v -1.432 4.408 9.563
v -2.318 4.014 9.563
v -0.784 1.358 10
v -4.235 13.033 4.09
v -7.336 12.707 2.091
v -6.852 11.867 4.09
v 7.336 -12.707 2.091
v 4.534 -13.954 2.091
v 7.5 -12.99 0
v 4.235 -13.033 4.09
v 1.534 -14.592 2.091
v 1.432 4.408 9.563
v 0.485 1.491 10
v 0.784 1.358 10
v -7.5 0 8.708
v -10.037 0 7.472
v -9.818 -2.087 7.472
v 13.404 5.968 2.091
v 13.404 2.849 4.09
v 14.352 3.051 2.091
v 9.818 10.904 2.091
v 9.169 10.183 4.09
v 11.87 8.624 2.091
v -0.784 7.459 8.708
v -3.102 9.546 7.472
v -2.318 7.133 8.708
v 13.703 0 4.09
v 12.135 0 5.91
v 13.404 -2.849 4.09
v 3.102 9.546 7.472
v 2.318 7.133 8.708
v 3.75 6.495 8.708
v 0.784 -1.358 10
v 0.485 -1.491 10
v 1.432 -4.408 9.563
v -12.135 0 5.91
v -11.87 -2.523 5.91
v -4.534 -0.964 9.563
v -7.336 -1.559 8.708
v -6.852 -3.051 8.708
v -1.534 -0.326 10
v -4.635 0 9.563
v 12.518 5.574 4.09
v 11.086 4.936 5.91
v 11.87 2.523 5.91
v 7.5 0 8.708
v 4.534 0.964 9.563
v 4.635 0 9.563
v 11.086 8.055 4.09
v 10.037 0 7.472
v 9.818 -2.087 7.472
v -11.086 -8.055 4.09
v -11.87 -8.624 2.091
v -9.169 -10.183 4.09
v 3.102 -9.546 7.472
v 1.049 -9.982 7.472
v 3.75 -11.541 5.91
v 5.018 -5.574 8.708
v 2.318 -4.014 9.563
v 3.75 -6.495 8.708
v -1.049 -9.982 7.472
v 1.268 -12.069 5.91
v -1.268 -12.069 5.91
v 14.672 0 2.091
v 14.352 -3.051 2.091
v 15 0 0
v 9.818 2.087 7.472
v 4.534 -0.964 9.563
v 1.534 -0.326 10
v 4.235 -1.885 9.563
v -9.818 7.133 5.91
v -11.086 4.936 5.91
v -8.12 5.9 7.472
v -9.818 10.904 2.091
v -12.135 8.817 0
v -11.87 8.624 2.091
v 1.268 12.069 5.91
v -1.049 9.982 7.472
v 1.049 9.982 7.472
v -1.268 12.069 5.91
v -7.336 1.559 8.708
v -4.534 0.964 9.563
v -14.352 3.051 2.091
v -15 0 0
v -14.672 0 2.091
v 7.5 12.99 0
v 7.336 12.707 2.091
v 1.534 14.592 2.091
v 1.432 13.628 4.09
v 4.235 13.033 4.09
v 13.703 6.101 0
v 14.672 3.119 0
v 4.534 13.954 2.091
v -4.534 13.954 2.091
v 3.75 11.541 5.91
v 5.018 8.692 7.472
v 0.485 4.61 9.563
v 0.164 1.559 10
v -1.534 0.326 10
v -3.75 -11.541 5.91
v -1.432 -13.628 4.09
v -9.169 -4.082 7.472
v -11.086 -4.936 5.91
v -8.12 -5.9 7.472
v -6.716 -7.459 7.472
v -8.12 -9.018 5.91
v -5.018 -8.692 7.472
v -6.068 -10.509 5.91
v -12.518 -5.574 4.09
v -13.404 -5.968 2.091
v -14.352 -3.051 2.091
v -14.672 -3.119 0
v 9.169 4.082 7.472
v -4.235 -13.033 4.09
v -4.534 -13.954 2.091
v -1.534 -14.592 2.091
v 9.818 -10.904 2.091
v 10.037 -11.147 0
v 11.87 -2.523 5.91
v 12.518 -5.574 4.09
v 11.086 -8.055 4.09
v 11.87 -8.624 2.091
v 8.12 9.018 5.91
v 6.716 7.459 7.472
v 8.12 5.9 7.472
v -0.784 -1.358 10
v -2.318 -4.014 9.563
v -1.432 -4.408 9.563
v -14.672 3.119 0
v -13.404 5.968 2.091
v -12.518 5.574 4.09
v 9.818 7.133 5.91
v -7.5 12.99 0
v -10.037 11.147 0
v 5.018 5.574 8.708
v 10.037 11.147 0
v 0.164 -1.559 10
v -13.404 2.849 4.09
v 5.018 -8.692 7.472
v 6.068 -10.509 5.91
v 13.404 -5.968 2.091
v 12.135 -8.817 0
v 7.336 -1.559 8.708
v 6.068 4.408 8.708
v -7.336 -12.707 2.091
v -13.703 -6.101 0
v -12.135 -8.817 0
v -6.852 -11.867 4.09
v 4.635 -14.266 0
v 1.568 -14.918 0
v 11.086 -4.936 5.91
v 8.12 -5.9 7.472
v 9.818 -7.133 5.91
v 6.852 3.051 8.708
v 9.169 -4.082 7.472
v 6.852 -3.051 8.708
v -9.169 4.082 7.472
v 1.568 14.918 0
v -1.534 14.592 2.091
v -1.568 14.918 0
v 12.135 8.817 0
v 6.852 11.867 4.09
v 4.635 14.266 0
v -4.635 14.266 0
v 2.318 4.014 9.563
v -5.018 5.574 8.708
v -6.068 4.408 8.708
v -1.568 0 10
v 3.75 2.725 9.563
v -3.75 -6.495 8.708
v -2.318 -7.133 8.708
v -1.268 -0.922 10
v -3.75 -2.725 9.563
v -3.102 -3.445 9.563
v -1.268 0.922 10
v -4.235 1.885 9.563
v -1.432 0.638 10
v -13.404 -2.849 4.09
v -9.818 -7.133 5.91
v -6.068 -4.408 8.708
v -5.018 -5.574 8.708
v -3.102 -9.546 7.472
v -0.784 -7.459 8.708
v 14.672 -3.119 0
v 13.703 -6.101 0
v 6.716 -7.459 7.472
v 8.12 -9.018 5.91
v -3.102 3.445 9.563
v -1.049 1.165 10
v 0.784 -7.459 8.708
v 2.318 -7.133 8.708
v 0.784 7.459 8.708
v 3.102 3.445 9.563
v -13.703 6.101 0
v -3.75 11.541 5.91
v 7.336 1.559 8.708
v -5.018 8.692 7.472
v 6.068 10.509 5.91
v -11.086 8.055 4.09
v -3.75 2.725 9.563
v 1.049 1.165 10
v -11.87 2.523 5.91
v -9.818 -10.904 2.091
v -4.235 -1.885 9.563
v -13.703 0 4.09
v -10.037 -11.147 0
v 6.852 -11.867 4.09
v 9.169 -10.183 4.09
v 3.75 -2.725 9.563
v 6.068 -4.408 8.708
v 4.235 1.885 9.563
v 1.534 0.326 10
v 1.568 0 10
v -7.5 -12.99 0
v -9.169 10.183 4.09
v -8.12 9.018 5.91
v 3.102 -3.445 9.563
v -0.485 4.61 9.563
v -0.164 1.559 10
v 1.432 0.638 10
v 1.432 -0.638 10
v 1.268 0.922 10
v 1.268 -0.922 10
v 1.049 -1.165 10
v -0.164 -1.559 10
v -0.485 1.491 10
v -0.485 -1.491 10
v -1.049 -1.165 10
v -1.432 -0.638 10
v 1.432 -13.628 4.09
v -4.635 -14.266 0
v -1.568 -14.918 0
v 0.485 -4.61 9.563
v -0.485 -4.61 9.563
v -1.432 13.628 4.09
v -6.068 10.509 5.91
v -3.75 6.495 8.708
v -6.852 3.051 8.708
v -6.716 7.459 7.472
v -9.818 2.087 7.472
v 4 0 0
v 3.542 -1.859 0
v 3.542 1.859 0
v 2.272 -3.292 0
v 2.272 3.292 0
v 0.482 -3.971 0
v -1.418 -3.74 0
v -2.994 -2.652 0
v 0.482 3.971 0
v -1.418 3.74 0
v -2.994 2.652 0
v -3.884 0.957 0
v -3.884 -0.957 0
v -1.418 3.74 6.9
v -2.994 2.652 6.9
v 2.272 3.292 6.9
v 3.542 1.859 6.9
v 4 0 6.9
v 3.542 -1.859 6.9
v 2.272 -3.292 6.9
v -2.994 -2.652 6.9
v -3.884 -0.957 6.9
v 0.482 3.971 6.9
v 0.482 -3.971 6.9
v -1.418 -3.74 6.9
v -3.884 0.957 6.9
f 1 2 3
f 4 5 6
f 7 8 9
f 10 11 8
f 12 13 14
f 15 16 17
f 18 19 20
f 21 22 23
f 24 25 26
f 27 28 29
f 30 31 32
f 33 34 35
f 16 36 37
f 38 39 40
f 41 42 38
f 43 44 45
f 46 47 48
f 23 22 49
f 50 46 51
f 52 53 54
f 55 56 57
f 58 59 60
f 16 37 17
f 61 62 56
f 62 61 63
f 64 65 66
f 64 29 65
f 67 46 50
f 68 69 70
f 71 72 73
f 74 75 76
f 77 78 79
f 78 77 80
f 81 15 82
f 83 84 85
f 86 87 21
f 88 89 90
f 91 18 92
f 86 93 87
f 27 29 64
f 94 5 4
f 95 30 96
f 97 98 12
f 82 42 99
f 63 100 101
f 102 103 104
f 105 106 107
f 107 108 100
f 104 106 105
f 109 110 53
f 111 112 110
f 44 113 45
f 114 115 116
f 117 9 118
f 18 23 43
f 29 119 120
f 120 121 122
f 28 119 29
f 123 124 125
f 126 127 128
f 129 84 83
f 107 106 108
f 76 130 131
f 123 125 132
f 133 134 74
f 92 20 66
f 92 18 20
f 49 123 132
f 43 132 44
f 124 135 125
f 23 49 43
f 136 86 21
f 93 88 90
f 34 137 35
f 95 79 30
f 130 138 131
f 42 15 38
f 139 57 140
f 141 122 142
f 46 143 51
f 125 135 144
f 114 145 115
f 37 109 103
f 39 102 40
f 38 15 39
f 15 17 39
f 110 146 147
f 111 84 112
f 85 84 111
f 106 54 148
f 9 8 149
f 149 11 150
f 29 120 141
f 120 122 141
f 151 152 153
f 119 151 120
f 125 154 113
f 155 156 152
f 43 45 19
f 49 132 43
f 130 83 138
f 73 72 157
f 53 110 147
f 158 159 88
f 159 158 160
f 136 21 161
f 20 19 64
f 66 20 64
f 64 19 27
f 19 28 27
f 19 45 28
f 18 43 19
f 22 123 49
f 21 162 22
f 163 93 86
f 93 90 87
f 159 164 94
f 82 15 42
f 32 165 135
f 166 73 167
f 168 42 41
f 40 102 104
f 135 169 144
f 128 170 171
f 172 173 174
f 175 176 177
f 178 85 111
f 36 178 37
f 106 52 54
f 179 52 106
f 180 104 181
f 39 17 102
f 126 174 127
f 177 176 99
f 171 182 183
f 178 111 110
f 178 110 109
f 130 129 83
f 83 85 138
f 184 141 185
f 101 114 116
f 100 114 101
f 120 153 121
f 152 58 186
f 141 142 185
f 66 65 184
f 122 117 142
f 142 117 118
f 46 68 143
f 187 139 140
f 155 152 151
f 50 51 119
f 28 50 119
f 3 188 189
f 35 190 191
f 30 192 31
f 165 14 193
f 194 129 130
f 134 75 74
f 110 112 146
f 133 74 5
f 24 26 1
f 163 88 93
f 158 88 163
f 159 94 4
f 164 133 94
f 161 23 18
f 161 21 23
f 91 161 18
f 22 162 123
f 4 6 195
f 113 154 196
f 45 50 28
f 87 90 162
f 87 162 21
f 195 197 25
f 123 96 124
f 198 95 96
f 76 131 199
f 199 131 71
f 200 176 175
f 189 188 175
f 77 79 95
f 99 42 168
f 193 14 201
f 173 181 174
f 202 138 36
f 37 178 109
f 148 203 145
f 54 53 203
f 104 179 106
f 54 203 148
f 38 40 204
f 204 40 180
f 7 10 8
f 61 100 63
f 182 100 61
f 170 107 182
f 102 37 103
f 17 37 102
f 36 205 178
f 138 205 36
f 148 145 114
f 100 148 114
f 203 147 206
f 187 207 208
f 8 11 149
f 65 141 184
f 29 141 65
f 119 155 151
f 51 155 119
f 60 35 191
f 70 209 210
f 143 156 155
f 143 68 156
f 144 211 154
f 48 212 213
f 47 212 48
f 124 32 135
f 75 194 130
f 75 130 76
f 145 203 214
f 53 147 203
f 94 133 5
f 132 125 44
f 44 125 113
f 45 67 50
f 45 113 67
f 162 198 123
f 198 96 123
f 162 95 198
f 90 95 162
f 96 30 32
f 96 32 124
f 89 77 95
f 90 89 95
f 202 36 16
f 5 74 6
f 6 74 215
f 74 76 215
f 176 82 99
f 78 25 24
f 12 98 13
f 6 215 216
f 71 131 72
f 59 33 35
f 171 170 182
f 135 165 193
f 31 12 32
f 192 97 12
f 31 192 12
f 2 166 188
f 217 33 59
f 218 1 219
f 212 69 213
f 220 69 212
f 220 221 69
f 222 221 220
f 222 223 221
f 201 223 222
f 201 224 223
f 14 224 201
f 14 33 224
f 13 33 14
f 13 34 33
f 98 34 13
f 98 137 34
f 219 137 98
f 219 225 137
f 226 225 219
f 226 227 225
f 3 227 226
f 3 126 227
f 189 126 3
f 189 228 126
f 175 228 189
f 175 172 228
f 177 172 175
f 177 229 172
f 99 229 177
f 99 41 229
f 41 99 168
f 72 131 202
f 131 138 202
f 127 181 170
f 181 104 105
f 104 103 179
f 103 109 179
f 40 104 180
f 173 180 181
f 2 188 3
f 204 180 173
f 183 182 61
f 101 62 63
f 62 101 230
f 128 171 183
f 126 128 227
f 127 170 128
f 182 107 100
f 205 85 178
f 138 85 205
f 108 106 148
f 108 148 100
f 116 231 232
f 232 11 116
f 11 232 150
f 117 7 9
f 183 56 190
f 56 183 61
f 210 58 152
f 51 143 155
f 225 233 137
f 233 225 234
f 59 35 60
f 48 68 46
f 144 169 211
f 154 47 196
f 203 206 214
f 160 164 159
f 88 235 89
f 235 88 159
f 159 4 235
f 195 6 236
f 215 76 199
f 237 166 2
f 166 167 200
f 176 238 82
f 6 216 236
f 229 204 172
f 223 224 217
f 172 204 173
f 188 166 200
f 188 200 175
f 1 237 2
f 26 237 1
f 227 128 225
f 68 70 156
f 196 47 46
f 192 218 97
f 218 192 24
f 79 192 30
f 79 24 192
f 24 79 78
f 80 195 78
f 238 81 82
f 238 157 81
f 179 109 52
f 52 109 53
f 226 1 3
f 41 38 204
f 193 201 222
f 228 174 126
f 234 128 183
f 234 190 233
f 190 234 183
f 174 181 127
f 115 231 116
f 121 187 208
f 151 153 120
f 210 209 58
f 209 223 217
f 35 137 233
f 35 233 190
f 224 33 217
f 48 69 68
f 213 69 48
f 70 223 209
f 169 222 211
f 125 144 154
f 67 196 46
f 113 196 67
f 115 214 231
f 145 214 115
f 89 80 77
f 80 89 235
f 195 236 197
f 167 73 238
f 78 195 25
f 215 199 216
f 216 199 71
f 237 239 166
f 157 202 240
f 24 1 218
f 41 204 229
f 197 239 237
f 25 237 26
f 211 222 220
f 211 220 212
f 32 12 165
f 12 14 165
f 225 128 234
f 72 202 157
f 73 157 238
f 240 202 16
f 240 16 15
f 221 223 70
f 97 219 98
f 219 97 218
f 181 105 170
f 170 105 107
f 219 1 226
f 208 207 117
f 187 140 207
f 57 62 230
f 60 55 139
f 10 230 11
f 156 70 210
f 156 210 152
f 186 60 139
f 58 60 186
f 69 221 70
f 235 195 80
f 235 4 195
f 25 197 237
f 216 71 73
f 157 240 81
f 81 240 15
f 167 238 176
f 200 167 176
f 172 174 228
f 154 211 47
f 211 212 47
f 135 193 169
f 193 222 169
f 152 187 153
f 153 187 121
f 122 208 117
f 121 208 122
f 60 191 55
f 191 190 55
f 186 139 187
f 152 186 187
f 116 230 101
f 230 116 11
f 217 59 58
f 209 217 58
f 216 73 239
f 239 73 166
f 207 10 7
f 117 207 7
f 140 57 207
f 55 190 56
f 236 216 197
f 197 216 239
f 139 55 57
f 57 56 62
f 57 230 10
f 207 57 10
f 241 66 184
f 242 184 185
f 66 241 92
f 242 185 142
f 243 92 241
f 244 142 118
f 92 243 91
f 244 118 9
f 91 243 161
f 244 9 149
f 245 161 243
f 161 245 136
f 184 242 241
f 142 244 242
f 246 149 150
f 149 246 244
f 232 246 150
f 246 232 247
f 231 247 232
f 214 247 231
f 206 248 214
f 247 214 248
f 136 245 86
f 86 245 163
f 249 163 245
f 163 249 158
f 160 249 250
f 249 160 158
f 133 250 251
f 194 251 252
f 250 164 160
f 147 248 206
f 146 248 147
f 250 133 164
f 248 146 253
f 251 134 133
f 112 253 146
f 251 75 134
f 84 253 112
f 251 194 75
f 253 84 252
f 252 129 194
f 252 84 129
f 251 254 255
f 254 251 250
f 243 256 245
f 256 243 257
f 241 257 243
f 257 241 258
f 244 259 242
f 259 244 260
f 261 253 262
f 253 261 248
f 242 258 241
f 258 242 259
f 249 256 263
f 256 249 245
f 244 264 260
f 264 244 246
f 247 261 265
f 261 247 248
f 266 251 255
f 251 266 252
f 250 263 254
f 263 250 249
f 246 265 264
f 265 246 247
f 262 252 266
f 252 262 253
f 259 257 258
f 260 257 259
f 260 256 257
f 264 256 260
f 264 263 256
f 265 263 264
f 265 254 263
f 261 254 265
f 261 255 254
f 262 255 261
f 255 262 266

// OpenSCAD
// file: common.scad
coin_small_diameter=30;
coin_big_diameter=36;
coin_height=3;

nut_diameter_inner = 6;
nut_diameter_outer = 8;

roller_diameter= 22;
roller_diameter_inner= 10;
roller_width = 8;
// main file
include <./common.scad>


tree_top_height = 10;
tree_top_diameter = 30;

tree_top_border = 3;

module tree_top(){
    difference(){
        resize([0, 0, tree_top_height*2])
        sphere(d = tree_top_diameter);
         
        translate([0,0,-tree_top_diameter/2])
        cube(tree_top_diameter, center= true);
        
        #
        translate([0,0,-0.1])
        cylinder(h=tree_top_height - tree_top_border , d=  nut_diameter_outer);
    }
}


tree_top();
